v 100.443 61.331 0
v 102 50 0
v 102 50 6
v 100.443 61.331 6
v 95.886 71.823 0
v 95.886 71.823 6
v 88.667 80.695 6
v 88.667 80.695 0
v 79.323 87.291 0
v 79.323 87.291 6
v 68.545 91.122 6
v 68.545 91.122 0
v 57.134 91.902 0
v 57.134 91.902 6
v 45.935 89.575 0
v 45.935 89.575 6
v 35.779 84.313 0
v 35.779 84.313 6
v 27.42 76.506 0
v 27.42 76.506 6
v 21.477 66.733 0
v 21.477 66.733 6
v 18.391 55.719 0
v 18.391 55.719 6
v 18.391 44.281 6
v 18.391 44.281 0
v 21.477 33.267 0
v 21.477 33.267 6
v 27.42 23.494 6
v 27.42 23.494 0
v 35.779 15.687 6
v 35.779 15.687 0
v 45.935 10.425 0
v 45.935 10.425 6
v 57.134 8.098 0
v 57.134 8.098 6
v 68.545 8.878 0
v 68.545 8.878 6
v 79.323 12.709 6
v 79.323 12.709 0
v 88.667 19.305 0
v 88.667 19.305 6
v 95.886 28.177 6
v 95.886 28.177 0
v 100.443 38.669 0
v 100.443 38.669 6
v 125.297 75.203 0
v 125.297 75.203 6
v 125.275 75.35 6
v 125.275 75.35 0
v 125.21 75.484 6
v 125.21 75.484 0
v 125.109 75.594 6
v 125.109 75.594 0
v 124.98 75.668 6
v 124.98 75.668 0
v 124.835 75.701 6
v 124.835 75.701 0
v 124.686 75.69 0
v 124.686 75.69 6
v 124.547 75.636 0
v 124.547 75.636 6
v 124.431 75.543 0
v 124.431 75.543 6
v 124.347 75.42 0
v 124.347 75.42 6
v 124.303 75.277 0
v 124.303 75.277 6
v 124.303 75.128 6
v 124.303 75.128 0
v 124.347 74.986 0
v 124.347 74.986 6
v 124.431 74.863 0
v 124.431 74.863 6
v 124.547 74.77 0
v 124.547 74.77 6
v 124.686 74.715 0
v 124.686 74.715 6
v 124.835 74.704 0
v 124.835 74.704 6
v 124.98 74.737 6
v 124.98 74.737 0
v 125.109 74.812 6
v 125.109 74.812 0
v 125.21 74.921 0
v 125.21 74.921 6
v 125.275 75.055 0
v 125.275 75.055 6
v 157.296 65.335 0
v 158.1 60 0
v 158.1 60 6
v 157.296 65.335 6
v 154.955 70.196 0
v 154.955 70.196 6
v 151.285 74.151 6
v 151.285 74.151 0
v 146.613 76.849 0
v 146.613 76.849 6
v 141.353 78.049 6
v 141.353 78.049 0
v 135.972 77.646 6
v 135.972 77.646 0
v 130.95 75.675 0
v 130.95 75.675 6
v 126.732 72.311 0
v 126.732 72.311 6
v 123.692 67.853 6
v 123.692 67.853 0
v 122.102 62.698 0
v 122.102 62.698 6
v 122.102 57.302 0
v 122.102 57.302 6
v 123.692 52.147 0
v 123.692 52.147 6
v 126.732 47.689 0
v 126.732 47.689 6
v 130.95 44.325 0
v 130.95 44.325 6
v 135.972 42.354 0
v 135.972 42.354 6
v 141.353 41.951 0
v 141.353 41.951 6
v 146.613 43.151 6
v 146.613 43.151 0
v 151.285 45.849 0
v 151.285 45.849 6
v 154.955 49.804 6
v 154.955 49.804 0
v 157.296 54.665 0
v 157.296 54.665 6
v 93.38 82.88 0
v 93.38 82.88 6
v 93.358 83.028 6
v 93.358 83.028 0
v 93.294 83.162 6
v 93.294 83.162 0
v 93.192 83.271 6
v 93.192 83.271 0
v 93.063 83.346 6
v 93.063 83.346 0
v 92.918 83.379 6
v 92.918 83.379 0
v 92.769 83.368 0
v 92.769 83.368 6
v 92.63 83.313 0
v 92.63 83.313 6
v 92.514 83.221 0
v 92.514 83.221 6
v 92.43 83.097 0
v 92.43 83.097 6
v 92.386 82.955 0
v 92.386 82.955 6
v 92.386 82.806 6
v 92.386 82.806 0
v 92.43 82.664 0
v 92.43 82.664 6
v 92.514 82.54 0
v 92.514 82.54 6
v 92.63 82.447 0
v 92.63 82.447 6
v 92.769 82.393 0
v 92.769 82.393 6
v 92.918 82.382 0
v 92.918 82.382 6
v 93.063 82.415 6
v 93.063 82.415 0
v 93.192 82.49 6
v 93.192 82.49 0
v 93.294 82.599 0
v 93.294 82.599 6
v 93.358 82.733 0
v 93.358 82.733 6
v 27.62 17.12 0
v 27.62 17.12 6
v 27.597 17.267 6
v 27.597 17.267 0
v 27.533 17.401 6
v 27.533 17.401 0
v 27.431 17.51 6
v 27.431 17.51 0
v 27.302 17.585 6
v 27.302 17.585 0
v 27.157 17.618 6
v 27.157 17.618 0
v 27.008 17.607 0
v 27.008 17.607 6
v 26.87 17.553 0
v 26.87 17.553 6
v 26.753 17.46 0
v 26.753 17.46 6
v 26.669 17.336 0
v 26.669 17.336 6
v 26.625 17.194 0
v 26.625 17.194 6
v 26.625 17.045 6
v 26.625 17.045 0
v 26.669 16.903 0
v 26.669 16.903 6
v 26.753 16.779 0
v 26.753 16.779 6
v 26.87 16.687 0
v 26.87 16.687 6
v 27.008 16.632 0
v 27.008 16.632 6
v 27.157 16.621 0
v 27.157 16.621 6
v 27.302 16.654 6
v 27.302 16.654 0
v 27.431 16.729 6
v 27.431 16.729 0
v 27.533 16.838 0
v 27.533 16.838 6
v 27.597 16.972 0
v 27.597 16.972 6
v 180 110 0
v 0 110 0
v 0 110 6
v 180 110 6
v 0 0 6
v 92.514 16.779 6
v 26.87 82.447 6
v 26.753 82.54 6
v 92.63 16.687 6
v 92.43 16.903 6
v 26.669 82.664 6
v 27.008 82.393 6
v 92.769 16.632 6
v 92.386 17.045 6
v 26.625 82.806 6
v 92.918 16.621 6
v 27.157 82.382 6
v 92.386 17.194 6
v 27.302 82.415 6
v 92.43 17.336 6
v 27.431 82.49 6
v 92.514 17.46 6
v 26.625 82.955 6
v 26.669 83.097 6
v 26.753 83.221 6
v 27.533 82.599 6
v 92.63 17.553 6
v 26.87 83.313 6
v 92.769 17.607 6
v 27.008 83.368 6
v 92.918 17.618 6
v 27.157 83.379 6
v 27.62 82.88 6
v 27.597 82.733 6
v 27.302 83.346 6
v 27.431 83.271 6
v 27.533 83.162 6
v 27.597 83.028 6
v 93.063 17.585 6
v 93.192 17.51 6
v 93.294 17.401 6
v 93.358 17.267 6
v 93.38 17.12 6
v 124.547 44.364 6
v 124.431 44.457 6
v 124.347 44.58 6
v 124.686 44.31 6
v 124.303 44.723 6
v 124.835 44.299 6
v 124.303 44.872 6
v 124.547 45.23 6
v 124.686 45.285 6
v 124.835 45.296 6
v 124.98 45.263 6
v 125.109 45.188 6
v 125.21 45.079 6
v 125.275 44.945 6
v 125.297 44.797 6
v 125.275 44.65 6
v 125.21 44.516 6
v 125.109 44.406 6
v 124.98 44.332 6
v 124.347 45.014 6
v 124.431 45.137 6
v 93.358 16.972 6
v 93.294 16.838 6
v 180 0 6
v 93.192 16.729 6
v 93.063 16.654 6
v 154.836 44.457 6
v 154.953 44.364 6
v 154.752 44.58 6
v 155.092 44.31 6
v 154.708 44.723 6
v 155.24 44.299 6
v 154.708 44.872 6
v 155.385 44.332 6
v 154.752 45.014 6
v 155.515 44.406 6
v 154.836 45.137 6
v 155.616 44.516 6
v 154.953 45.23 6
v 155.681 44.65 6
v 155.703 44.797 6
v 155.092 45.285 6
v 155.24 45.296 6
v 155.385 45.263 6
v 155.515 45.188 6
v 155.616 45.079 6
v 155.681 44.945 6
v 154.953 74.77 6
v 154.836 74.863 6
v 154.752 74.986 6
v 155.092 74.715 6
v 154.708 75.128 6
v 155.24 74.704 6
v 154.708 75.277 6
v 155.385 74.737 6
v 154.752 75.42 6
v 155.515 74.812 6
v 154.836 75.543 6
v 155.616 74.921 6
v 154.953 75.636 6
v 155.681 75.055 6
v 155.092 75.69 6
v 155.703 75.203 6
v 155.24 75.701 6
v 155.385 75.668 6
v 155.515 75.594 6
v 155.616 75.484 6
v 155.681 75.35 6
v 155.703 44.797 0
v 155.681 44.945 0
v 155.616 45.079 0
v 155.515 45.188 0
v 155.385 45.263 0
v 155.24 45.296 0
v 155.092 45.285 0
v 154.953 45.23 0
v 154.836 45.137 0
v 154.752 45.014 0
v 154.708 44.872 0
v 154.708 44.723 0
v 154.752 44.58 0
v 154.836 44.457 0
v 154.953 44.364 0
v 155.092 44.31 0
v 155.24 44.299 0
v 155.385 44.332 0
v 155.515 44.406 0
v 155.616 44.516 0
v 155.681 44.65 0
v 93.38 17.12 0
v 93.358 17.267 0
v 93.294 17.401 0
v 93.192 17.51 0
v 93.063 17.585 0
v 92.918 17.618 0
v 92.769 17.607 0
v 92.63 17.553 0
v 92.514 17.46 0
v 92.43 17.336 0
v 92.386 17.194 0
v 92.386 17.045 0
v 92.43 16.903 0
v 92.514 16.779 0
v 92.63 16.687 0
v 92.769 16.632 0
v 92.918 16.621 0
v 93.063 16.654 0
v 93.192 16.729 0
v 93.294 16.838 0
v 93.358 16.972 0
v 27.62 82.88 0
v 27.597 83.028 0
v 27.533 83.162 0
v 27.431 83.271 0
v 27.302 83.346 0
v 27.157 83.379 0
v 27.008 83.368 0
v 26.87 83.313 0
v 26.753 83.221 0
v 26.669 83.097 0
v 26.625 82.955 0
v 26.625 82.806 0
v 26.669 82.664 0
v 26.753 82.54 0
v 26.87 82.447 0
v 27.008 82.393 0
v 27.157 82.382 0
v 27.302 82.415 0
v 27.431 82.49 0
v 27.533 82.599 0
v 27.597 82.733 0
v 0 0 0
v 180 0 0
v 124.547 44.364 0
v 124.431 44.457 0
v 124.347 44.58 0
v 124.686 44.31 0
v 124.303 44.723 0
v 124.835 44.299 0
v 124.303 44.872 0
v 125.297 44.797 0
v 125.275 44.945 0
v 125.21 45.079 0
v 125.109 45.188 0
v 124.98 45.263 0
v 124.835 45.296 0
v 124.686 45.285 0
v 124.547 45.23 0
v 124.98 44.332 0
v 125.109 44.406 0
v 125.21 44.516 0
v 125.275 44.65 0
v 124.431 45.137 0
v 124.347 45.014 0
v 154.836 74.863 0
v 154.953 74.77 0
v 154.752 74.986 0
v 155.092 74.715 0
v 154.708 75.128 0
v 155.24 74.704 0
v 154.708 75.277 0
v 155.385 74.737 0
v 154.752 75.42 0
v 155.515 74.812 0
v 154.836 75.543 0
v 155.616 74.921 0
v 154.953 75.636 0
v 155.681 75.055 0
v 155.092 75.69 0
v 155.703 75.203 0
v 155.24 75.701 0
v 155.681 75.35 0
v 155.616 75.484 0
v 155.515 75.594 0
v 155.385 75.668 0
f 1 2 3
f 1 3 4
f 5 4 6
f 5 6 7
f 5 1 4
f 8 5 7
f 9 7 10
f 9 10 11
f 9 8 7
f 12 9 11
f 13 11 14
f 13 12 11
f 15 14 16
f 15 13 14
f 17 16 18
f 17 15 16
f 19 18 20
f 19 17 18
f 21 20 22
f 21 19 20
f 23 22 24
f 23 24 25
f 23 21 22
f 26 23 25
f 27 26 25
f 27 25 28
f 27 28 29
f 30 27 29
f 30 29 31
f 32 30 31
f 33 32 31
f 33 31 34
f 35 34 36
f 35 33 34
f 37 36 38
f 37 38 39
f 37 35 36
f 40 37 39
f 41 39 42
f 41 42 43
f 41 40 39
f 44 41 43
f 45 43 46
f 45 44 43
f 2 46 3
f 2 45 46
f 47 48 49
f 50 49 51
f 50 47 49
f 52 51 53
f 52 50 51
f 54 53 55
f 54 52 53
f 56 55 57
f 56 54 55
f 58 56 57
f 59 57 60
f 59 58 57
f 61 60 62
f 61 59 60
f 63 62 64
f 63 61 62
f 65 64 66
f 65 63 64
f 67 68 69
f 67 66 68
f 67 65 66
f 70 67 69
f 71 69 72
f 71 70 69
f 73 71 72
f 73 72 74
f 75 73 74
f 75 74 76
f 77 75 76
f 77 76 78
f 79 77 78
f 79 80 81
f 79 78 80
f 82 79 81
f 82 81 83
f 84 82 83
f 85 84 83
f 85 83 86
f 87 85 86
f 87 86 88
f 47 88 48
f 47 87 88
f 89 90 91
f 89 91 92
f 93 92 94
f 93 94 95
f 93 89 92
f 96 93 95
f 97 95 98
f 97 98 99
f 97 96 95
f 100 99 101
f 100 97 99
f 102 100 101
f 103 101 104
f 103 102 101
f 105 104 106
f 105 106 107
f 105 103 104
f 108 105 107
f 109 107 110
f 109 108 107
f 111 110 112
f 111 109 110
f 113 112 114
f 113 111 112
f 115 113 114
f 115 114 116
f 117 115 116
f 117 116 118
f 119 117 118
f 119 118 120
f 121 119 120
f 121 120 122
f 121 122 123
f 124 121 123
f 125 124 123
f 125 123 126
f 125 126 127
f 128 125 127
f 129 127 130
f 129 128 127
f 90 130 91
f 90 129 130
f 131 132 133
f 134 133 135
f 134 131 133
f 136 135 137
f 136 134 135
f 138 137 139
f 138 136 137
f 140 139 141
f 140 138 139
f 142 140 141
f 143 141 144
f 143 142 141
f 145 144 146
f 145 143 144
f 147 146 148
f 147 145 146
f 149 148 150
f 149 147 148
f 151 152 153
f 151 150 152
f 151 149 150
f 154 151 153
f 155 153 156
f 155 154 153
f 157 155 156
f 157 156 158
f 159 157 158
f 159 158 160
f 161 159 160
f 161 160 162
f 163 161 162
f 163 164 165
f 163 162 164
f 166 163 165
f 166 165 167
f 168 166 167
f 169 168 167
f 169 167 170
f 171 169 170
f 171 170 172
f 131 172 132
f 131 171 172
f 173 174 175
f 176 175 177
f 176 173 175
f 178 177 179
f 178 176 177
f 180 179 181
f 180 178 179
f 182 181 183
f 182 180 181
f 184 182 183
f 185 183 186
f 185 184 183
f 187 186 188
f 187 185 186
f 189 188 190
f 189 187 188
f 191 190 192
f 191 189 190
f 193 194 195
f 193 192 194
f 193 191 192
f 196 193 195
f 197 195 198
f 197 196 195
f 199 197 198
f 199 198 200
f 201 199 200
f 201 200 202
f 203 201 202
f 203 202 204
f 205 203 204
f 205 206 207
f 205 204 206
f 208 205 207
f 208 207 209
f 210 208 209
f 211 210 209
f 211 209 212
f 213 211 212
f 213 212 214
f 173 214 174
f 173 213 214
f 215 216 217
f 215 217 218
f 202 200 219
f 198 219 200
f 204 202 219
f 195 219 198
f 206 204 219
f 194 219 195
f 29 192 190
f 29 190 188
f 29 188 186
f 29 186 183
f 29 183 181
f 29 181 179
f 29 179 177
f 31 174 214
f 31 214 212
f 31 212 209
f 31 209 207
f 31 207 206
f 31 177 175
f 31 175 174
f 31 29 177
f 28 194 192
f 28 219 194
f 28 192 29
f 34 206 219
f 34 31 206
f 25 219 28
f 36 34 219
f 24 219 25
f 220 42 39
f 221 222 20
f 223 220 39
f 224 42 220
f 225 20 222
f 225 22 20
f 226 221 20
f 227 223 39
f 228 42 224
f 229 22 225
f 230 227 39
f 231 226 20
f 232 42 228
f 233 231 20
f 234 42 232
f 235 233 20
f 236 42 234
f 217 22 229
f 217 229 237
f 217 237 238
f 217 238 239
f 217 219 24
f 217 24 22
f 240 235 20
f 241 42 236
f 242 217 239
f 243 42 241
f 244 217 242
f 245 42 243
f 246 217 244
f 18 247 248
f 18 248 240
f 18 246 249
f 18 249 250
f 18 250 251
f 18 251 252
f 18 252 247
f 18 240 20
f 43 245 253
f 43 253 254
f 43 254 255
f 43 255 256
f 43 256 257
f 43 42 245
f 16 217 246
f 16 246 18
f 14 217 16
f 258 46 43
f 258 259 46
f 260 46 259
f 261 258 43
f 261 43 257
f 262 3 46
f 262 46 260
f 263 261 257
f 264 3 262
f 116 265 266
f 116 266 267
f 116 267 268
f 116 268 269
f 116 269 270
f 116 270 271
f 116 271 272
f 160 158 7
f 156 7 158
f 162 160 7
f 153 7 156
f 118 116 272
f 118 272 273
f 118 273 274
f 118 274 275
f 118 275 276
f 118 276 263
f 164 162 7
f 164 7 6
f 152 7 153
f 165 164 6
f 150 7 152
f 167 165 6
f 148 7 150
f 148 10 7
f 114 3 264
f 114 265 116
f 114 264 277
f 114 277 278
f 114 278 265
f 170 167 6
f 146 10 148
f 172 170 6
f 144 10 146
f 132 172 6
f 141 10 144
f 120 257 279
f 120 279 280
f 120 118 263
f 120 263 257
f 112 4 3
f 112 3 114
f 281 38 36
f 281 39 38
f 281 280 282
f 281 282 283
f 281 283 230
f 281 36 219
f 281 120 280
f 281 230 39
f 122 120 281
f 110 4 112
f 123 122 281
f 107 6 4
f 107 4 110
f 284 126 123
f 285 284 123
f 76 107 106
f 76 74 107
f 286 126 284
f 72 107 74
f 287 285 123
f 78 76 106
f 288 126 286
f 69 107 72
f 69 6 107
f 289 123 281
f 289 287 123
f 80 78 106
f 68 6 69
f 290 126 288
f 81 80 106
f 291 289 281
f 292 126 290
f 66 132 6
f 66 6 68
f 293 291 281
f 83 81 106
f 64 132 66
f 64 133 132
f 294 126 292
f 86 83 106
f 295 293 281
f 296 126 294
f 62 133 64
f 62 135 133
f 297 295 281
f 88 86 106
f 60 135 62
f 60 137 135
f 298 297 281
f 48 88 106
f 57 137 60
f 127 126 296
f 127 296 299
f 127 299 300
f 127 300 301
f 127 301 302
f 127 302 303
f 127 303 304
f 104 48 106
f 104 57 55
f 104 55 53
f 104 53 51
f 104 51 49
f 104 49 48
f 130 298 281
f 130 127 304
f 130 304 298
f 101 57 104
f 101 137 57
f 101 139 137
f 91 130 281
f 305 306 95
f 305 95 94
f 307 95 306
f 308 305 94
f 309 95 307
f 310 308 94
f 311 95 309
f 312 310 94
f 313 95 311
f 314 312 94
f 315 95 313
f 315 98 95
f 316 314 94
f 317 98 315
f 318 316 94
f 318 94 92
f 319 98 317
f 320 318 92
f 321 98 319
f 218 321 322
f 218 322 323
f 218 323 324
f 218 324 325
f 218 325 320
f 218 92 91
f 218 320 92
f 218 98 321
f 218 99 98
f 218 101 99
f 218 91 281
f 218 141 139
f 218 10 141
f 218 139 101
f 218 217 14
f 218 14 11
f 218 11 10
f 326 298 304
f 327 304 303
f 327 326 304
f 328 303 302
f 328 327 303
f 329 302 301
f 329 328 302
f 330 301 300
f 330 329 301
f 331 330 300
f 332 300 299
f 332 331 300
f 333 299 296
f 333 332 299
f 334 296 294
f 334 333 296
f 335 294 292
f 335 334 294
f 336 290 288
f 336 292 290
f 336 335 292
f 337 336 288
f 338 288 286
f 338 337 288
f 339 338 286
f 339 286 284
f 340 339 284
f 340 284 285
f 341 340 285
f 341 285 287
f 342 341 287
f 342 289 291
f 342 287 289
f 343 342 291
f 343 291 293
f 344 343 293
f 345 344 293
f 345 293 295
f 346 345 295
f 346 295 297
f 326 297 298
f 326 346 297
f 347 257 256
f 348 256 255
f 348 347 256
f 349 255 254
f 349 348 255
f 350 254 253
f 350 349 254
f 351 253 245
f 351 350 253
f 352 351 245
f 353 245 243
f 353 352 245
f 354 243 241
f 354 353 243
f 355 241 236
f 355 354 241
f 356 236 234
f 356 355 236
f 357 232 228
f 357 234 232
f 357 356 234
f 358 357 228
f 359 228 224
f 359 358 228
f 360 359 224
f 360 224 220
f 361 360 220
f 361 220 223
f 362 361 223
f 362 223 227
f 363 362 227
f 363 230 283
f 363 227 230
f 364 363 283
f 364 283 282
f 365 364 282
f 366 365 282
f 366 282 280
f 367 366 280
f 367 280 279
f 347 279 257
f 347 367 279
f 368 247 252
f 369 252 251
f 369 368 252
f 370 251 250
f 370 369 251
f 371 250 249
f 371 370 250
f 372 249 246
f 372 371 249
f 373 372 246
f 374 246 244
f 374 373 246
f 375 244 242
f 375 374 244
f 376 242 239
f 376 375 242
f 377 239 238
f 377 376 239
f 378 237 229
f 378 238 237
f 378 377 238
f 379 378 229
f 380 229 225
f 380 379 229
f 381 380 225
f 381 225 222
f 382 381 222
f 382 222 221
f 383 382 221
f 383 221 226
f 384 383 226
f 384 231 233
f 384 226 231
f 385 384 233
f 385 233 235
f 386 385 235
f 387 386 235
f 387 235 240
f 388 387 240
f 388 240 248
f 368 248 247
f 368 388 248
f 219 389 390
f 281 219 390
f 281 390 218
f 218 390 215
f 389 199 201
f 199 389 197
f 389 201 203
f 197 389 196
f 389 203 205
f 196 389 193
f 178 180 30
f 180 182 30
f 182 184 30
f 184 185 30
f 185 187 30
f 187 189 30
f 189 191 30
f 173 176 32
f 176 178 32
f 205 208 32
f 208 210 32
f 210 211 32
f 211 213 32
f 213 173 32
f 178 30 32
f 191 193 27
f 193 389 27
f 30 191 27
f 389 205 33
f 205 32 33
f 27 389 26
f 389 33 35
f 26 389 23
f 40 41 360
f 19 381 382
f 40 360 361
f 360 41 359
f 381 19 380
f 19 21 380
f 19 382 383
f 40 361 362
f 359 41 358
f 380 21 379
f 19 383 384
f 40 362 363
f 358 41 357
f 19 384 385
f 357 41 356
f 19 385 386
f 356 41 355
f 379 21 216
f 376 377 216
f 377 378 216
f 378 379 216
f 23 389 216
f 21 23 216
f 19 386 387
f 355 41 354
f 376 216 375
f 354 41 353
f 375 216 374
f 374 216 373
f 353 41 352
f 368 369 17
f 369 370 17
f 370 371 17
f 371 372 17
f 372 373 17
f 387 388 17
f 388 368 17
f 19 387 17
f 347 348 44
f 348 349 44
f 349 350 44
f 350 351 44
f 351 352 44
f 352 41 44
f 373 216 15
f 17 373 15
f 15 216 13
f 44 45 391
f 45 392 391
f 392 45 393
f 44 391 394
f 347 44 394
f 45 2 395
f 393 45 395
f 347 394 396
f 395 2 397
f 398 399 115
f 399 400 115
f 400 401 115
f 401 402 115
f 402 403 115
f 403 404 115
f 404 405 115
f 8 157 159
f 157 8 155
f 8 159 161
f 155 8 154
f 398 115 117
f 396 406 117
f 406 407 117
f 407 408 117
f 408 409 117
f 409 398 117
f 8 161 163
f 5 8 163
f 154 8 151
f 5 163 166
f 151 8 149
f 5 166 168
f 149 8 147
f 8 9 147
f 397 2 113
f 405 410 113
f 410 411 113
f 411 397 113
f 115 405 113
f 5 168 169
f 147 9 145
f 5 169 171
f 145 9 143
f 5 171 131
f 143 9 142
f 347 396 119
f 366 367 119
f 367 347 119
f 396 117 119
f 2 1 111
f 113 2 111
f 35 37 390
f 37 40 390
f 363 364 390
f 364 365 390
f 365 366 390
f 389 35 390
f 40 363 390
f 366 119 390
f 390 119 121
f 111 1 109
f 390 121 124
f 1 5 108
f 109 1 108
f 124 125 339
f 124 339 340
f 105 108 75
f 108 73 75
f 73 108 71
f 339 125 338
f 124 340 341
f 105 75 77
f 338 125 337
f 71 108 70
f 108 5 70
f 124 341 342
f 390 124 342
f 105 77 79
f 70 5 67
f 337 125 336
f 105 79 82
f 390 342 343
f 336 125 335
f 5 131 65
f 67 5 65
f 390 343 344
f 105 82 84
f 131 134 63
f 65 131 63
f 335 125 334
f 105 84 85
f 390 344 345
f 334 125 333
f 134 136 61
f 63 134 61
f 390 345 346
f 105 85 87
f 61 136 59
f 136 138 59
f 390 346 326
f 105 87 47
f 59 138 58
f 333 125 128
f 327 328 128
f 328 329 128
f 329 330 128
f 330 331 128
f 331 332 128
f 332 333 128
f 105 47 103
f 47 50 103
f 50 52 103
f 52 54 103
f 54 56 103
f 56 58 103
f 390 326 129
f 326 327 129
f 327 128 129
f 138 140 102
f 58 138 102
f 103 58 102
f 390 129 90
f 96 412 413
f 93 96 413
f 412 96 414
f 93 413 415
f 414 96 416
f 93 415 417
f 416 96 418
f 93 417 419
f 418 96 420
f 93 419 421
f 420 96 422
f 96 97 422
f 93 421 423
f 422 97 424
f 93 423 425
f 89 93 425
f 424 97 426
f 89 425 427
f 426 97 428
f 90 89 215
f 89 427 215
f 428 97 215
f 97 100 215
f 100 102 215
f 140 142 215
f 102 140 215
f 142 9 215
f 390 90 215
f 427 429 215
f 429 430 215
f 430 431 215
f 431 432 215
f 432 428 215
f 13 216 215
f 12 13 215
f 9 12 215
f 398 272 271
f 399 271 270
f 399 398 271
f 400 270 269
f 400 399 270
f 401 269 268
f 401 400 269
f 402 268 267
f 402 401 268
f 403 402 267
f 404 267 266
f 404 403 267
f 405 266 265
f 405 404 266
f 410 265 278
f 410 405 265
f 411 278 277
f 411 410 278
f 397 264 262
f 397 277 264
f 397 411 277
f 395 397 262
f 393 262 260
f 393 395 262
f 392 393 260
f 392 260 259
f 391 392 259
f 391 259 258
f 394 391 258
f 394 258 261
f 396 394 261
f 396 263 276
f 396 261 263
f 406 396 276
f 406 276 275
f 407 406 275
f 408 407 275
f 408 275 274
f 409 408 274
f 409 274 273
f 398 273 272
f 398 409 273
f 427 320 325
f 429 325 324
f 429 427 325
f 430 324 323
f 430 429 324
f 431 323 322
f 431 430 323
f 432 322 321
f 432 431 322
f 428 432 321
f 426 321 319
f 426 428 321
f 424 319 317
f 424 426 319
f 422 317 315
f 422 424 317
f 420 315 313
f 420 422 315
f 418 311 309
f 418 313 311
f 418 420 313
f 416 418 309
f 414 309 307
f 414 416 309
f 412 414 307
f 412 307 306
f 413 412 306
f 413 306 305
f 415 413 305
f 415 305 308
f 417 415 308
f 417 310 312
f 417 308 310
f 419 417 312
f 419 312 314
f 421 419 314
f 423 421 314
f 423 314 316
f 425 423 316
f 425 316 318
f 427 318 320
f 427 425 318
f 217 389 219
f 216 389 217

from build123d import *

# Parameters (mm, degrees)
SKETCH1_W           = 180
SKETCH1_H           = 110
SKETCH1_R           = 42
SKETCH1_R_2         = 18.1
BOSS_EXTRUDE1_DEPTH = 6
SKETCH3_R           = 0.5
CUT_EXTRUDE1_DEPTH  = 30


with BuildPart() as part:
    # Sketch1 → Boss-Extrude1 (new body)
    with BuildSketch(Plane.XY):
        with Locations((90, 55)):
            Rectangle(SKETCH1_W, SKETCH1_H)
        with Locations((60, 50)):
            Circle(SKETCH1_R, mode=Mode.SUBTRACT)
        with Locations((140, 60)):
            Circle(SKETCH1_R_2, mode=Mode.SUBTRACT)
    extrude(amount=BOSS_EXTRUDE1_DEPTH)

    # Sketch3 → Cut-Extrude1 (cut)
    with BuildSketch(Plane.XY):
        with Locations((92.880465325, 82.880465325)):
            Circle(SKETCH3_R)
        with Locations((27.119534675, 82.880465325)):
            Circle(SKETCH3_R)
        with Locations((27.119534675, 17.119534675)):
            Circle(SKETCH3_R)
        with Locations((92.880465325, 17.119534675)):
            Circle(SKETCH3_R)
        with Locations((155.202795796, 75.202795796)):
            Circle(SKETCH3_R)
        with Locations((124.797204204, 75.202795796)):
            Circle(SKETCH3_R)
        with Locations((124.797204204, 44.797204204)):
            Circle(SKETCH3_R)
        with Locations((155.202795796, 44.797204204)):
            Circle(SKETCH3_R)
    extrude(amount=CUT_EXTRUDE1_DEPTH, mode=Mode.SUBTRACT)


solid = part.part
